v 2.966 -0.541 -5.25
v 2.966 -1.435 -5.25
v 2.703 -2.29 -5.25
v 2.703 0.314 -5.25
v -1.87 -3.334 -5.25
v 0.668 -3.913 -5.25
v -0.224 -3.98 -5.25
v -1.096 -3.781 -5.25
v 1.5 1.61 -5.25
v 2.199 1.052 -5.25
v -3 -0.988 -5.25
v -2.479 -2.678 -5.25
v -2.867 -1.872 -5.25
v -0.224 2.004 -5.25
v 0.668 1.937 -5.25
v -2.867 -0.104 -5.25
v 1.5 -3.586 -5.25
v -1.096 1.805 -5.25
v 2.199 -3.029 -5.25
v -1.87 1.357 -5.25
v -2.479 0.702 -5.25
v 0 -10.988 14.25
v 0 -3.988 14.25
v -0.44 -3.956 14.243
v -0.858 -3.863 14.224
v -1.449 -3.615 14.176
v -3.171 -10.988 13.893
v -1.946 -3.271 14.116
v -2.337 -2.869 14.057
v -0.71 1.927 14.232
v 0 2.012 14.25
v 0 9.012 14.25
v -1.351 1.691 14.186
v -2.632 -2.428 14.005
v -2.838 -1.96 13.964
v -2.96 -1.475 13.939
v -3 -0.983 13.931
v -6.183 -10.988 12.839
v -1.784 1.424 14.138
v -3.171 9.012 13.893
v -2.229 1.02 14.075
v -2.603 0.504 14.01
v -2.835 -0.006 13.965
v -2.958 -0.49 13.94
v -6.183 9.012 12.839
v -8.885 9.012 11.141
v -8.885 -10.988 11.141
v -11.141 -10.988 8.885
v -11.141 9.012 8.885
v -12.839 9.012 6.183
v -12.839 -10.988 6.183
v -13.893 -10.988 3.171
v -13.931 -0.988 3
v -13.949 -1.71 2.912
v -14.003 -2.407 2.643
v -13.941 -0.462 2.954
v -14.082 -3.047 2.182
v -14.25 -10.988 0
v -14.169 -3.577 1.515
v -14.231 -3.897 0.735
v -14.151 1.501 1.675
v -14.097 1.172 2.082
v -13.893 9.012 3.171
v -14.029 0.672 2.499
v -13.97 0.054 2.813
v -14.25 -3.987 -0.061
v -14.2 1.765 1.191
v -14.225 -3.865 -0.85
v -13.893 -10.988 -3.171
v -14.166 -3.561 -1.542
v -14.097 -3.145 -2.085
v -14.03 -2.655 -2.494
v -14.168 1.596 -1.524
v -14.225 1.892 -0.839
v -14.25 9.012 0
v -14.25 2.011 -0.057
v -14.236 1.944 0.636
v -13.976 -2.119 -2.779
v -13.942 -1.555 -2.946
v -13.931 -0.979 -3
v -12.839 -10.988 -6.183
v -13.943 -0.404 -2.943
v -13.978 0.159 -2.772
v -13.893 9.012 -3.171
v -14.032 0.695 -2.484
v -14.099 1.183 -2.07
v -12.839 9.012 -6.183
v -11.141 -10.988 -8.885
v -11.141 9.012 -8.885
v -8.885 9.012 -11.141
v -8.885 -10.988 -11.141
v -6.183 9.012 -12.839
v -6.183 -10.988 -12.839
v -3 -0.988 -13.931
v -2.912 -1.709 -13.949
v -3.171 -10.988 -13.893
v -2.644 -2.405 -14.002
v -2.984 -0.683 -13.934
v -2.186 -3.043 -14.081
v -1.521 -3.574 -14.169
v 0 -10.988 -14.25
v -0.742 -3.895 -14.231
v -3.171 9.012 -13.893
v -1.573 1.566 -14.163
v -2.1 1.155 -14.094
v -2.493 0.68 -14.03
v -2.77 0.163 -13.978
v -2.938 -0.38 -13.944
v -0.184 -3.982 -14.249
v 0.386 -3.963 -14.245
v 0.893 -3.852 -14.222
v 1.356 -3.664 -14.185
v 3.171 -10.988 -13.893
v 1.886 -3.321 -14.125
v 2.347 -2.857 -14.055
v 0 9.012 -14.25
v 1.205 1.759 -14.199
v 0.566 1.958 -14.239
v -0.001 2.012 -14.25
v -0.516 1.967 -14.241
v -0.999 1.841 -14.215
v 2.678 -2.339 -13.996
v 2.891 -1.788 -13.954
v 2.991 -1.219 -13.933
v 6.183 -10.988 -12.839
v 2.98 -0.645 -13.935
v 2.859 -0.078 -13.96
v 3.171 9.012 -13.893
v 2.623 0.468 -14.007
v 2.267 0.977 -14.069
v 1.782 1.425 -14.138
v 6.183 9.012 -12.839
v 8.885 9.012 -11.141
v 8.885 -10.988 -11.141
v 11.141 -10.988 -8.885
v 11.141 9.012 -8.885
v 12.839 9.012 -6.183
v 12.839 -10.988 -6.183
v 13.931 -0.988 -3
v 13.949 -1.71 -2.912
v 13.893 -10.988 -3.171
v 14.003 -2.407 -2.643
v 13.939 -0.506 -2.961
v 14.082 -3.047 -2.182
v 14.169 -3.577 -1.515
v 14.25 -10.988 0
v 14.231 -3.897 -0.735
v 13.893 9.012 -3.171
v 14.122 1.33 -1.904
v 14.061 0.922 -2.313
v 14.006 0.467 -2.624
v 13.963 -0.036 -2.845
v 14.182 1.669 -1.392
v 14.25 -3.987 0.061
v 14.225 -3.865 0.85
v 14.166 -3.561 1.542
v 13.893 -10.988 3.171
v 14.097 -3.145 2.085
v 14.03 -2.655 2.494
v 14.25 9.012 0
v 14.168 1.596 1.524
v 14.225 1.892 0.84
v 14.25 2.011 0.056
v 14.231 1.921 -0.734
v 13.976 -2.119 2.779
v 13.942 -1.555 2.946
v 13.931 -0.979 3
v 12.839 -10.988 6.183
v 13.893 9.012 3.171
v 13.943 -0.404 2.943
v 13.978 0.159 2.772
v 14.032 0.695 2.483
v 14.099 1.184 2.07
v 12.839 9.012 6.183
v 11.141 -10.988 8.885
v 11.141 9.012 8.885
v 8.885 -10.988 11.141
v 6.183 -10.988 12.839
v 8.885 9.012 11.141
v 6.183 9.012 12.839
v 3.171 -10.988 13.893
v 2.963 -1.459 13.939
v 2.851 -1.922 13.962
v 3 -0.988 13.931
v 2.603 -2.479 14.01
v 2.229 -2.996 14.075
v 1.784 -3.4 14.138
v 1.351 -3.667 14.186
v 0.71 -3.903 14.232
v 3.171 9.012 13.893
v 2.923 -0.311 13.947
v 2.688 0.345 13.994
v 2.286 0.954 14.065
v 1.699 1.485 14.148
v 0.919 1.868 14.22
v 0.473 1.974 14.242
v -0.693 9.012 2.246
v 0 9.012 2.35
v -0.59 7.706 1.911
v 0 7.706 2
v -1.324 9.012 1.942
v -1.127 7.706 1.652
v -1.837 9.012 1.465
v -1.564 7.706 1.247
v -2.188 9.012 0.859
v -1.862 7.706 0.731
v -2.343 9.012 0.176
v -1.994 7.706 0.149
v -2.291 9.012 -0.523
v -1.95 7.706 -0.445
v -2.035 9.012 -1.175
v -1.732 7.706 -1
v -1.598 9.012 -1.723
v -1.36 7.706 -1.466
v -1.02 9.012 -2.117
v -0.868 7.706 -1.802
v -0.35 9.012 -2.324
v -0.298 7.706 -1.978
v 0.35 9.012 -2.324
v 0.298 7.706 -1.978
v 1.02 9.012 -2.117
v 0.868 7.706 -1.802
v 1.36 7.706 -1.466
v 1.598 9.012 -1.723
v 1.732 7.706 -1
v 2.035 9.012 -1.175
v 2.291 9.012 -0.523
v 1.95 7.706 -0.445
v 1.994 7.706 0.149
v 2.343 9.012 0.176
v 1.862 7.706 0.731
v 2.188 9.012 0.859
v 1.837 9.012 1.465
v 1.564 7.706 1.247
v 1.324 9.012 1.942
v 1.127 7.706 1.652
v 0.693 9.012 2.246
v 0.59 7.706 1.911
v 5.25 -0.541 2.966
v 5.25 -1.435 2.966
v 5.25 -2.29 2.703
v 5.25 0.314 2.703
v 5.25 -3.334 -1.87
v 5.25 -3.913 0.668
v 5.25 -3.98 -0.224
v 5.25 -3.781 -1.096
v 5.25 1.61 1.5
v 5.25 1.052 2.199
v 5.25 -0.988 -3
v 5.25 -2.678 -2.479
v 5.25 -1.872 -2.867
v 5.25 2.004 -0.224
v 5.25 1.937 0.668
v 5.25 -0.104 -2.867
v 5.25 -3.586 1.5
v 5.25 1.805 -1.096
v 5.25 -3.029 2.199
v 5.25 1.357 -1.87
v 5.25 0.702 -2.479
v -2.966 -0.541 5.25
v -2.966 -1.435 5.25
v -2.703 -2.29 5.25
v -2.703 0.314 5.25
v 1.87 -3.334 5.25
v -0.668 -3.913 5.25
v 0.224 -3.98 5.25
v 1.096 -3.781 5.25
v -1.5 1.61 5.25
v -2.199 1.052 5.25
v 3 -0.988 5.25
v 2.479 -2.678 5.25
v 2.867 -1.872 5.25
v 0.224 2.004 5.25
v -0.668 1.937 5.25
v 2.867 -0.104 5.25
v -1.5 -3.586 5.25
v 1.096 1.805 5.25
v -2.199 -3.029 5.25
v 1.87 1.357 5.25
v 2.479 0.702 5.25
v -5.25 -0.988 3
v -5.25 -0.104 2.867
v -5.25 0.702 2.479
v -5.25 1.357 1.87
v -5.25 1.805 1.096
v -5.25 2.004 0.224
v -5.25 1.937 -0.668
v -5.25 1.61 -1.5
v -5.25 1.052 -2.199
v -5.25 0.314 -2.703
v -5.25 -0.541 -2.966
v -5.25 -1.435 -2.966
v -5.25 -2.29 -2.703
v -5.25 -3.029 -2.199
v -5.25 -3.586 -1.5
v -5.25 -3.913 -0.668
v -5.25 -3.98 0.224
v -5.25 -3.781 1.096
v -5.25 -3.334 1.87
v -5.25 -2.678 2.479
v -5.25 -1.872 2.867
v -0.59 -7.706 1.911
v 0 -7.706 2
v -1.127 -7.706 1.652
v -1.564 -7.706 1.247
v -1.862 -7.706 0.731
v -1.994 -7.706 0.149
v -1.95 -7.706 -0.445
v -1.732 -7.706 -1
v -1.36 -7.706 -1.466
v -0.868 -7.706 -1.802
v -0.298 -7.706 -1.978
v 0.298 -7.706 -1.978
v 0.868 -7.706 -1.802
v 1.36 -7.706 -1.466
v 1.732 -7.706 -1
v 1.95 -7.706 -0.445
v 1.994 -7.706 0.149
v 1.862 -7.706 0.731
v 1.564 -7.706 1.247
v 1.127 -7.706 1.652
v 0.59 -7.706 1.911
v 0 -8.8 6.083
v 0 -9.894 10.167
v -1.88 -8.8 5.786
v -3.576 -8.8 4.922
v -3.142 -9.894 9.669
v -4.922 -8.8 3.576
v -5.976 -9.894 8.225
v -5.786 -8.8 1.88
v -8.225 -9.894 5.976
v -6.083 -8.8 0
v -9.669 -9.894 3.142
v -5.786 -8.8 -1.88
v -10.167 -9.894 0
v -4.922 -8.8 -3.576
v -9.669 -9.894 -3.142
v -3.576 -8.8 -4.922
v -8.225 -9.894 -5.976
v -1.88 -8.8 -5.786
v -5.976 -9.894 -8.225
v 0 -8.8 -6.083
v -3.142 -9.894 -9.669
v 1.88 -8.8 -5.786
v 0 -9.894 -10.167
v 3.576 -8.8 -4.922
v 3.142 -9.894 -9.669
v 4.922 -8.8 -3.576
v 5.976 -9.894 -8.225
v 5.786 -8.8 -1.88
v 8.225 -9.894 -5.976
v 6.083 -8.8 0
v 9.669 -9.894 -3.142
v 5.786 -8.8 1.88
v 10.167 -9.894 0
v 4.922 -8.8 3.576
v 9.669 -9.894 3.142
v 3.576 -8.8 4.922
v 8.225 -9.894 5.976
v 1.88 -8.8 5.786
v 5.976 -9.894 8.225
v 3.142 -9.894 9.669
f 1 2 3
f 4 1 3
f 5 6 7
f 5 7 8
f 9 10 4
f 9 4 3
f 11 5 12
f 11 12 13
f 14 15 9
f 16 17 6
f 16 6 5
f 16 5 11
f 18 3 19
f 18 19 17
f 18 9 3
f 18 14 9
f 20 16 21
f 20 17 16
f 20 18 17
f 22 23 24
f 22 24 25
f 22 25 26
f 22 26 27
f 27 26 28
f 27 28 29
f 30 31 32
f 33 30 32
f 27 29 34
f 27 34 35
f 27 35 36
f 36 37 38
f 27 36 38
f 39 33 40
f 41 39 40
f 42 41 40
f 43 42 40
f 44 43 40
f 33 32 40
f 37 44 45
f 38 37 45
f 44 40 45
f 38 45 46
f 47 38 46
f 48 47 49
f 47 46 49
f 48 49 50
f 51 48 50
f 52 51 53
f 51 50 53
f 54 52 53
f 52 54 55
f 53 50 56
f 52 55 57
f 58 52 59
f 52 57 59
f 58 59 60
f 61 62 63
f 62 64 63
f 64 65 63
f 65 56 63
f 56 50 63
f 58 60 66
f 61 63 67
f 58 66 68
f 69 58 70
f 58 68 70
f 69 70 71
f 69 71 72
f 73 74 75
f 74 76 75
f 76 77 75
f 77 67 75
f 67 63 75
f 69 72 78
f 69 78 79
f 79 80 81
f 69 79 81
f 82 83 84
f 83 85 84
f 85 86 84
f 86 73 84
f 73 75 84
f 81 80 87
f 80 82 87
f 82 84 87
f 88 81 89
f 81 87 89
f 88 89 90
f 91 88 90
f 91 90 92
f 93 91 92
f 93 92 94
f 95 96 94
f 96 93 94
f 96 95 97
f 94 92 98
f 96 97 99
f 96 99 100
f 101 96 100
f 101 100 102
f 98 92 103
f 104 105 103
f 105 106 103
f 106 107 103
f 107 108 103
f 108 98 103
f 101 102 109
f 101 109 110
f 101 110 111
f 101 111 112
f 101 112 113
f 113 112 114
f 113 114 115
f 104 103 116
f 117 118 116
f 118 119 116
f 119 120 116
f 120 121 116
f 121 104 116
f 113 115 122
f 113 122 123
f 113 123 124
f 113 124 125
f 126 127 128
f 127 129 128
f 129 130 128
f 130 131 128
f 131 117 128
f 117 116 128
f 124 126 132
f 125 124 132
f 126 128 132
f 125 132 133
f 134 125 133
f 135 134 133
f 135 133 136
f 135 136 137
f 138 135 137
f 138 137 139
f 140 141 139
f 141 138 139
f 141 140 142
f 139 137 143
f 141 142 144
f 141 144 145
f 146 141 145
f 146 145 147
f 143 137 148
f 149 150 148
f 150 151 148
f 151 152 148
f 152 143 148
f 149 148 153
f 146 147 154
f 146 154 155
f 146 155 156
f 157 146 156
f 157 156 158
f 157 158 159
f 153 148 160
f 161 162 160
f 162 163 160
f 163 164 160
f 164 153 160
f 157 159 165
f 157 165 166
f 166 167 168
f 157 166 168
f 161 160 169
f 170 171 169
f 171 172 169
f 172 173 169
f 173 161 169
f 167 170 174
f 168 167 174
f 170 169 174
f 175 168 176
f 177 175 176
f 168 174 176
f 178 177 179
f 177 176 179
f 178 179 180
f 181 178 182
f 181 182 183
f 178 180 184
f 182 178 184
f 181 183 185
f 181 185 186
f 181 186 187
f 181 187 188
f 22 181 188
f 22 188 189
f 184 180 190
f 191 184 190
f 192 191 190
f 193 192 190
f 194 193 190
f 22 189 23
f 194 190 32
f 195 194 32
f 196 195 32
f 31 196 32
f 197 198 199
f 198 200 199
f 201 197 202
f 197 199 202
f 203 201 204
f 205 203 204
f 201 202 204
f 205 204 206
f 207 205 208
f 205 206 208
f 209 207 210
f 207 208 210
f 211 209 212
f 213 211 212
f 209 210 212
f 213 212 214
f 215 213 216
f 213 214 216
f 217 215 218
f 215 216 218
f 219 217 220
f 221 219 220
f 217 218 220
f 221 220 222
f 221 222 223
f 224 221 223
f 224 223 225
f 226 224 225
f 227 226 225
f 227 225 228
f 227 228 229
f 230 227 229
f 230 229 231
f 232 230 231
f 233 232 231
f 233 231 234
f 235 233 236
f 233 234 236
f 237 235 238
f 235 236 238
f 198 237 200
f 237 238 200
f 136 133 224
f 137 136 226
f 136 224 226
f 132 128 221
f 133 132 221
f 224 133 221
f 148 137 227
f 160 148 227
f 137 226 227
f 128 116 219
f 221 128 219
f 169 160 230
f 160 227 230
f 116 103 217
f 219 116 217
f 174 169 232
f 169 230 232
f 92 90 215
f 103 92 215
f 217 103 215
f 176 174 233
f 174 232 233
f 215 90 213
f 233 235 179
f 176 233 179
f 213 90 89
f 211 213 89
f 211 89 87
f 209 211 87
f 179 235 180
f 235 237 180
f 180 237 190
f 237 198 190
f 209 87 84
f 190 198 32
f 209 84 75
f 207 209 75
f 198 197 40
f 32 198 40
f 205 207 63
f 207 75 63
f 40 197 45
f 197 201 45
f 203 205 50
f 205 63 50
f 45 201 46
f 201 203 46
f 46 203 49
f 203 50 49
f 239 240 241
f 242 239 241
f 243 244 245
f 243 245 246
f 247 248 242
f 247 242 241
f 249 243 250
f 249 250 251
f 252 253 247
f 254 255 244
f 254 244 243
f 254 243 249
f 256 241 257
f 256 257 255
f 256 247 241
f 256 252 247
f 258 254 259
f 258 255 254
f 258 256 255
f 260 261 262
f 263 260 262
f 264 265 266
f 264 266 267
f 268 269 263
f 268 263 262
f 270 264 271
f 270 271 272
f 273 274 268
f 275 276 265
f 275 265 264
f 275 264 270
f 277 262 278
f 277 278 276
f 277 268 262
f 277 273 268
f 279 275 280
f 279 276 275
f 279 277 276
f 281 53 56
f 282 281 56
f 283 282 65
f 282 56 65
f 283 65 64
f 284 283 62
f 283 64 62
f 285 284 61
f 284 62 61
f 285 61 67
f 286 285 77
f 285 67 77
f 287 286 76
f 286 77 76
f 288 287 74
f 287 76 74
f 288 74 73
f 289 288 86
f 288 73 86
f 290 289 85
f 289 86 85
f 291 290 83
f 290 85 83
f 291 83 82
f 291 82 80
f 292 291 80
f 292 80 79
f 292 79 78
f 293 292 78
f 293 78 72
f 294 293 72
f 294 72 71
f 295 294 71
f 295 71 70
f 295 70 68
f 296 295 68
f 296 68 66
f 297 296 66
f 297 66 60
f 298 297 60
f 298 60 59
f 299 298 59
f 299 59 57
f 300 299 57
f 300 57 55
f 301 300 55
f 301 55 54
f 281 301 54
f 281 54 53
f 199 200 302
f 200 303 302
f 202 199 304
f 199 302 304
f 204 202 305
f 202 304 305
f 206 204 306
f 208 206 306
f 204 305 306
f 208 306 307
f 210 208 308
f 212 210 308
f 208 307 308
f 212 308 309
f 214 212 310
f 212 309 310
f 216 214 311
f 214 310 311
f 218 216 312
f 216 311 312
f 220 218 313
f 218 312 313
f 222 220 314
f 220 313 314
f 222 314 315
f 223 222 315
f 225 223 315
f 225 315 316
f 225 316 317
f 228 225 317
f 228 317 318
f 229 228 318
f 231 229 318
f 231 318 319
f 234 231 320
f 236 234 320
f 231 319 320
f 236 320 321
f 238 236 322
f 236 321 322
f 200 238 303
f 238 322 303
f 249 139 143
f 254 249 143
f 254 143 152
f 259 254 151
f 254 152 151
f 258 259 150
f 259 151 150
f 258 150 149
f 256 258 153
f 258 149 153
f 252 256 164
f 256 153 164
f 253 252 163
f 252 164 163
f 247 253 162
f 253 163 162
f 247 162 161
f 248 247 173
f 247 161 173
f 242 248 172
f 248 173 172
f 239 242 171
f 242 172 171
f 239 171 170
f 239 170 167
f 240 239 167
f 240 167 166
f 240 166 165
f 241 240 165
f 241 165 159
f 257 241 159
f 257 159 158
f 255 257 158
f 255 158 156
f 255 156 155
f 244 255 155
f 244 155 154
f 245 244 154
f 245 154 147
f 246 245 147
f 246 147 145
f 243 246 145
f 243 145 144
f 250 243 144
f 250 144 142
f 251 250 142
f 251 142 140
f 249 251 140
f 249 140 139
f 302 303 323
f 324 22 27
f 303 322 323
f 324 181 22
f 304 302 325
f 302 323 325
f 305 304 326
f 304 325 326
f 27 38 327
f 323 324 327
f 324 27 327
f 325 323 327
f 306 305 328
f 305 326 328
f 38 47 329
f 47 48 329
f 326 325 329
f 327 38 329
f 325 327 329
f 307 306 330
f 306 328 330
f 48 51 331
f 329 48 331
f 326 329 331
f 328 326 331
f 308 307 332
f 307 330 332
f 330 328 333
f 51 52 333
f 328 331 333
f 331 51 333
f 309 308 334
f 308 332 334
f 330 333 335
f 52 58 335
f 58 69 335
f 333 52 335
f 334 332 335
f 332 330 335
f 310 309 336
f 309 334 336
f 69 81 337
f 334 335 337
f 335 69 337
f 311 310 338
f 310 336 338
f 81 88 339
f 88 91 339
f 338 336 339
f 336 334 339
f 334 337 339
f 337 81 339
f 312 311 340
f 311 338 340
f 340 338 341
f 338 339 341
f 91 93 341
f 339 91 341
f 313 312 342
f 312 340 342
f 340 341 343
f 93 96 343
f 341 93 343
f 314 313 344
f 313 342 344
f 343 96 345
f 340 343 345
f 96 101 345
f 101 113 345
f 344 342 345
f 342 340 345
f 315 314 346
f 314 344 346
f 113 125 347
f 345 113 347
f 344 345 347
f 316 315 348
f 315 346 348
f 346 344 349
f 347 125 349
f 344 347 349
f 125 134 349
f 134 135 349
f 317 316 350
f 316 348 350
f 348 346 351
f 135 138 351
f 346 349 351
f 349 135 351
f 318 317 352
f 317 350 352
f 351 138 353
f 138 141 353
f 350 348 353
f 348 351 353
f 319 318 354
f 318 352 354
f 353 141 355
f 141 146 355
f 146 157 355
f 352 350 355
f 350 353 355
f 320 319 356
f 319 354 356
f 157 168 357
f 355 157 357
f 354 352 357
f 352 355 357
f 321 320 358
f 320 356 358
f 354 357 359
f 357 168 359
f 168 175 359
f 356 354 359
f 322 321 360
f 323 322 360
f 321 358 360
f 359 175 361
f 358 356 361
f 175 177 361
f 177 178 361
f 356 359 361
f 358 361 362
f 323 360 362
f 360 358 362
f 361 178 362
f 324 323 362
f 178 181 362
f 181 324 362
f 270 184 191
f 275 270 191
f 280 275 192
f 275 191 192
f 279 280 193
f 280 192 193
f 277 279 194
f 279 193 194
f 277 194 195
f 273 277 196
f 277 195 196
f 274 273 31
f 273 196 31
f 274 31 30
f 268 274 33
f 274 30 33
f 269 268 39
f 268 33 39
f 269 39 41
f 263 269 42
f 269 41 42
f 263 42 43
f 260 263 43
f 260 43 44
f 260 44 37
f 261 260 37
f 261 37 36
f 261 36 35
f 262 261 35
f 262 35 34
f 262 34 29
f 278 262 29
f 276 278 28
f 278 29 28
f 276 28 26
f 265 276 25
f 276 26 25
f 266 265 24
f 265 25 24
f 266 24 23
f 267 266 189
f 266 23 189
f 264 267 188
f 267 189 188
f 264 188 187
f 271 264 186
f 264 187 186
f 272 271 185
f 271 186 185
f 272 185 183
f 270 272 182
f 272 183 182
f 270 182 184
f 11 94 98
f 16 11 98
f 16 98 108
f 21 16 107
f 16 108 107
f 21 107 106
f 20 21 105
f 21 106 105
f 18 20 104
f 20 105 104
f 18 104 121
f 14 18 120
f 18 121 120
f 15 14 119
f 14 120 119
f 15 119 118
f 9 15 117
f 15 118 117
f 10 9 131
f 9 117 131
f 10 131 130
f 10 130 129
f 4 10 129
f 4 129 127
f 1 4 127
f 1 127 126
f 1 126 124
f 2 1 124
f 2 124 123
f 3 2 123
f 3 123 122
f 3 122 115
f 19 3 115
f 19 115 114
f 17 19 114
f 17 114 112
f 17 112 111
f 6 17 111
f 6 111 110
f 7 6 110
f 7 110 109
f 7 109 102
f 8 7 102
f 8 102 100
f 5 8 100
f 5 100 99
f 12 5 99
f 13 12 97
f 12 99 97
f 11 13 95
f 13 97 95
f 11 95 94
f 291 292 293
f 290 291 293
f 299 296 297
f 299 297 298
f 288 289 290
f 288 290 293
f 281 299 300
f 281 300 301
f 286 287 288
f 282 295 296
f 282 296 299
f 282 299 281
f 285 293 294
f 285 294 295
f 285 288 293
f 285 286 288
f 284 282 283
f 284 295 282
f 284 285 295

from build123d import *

# Parameters (mm, degrees)
SKETCH2_R          = 3
CUT_EXTRUDE1_DEPTH = 9
CIRPATTERN1_COUNT  = 4


with BuildPart() as part:
    # Sketch1 → Revolve1 (revolve)
    with BuildSketch(Plane.XY):
        Polygon((-2, 7.705702305), (-2, -7.705702305), (-14.25, -10.988079912), (-14.25, 9.011920088), (-2.35, 9.011920088), align=None)
    revolve(axis=Axis((0, 20.798274686, 0), (0, -1, 0)))

    # Sketch2 → Cut-Extrude1 (cut)
    with BuildSketch(Plane(origin=(14.25, 0, 0), x_dir=(0, 0, -1), z_dir=(1, 0, 0))):
        with Locations((0, -0.988079912)):
            Circle(SKETCH2_R)
    cut_extrude1 = extrude(amount=-CUT_EXTRUDE1_DEPTH, mode=Mode.SUBTRACT)

    # CirPattern1: Cut-Extrude1 ×4 about axis
    cirpattern1_axis = Axis((0, -10.988079912, 0), (0, 1, 0))
    for i in range(1, CIRPATTERN1_COUNT):
        add(cut_extrude1.rotate(cirpattern1_axis, i * 360 / CIRPATTERN1_COUNT), mode=Mode.SUBTRACT)


solid = part.part
